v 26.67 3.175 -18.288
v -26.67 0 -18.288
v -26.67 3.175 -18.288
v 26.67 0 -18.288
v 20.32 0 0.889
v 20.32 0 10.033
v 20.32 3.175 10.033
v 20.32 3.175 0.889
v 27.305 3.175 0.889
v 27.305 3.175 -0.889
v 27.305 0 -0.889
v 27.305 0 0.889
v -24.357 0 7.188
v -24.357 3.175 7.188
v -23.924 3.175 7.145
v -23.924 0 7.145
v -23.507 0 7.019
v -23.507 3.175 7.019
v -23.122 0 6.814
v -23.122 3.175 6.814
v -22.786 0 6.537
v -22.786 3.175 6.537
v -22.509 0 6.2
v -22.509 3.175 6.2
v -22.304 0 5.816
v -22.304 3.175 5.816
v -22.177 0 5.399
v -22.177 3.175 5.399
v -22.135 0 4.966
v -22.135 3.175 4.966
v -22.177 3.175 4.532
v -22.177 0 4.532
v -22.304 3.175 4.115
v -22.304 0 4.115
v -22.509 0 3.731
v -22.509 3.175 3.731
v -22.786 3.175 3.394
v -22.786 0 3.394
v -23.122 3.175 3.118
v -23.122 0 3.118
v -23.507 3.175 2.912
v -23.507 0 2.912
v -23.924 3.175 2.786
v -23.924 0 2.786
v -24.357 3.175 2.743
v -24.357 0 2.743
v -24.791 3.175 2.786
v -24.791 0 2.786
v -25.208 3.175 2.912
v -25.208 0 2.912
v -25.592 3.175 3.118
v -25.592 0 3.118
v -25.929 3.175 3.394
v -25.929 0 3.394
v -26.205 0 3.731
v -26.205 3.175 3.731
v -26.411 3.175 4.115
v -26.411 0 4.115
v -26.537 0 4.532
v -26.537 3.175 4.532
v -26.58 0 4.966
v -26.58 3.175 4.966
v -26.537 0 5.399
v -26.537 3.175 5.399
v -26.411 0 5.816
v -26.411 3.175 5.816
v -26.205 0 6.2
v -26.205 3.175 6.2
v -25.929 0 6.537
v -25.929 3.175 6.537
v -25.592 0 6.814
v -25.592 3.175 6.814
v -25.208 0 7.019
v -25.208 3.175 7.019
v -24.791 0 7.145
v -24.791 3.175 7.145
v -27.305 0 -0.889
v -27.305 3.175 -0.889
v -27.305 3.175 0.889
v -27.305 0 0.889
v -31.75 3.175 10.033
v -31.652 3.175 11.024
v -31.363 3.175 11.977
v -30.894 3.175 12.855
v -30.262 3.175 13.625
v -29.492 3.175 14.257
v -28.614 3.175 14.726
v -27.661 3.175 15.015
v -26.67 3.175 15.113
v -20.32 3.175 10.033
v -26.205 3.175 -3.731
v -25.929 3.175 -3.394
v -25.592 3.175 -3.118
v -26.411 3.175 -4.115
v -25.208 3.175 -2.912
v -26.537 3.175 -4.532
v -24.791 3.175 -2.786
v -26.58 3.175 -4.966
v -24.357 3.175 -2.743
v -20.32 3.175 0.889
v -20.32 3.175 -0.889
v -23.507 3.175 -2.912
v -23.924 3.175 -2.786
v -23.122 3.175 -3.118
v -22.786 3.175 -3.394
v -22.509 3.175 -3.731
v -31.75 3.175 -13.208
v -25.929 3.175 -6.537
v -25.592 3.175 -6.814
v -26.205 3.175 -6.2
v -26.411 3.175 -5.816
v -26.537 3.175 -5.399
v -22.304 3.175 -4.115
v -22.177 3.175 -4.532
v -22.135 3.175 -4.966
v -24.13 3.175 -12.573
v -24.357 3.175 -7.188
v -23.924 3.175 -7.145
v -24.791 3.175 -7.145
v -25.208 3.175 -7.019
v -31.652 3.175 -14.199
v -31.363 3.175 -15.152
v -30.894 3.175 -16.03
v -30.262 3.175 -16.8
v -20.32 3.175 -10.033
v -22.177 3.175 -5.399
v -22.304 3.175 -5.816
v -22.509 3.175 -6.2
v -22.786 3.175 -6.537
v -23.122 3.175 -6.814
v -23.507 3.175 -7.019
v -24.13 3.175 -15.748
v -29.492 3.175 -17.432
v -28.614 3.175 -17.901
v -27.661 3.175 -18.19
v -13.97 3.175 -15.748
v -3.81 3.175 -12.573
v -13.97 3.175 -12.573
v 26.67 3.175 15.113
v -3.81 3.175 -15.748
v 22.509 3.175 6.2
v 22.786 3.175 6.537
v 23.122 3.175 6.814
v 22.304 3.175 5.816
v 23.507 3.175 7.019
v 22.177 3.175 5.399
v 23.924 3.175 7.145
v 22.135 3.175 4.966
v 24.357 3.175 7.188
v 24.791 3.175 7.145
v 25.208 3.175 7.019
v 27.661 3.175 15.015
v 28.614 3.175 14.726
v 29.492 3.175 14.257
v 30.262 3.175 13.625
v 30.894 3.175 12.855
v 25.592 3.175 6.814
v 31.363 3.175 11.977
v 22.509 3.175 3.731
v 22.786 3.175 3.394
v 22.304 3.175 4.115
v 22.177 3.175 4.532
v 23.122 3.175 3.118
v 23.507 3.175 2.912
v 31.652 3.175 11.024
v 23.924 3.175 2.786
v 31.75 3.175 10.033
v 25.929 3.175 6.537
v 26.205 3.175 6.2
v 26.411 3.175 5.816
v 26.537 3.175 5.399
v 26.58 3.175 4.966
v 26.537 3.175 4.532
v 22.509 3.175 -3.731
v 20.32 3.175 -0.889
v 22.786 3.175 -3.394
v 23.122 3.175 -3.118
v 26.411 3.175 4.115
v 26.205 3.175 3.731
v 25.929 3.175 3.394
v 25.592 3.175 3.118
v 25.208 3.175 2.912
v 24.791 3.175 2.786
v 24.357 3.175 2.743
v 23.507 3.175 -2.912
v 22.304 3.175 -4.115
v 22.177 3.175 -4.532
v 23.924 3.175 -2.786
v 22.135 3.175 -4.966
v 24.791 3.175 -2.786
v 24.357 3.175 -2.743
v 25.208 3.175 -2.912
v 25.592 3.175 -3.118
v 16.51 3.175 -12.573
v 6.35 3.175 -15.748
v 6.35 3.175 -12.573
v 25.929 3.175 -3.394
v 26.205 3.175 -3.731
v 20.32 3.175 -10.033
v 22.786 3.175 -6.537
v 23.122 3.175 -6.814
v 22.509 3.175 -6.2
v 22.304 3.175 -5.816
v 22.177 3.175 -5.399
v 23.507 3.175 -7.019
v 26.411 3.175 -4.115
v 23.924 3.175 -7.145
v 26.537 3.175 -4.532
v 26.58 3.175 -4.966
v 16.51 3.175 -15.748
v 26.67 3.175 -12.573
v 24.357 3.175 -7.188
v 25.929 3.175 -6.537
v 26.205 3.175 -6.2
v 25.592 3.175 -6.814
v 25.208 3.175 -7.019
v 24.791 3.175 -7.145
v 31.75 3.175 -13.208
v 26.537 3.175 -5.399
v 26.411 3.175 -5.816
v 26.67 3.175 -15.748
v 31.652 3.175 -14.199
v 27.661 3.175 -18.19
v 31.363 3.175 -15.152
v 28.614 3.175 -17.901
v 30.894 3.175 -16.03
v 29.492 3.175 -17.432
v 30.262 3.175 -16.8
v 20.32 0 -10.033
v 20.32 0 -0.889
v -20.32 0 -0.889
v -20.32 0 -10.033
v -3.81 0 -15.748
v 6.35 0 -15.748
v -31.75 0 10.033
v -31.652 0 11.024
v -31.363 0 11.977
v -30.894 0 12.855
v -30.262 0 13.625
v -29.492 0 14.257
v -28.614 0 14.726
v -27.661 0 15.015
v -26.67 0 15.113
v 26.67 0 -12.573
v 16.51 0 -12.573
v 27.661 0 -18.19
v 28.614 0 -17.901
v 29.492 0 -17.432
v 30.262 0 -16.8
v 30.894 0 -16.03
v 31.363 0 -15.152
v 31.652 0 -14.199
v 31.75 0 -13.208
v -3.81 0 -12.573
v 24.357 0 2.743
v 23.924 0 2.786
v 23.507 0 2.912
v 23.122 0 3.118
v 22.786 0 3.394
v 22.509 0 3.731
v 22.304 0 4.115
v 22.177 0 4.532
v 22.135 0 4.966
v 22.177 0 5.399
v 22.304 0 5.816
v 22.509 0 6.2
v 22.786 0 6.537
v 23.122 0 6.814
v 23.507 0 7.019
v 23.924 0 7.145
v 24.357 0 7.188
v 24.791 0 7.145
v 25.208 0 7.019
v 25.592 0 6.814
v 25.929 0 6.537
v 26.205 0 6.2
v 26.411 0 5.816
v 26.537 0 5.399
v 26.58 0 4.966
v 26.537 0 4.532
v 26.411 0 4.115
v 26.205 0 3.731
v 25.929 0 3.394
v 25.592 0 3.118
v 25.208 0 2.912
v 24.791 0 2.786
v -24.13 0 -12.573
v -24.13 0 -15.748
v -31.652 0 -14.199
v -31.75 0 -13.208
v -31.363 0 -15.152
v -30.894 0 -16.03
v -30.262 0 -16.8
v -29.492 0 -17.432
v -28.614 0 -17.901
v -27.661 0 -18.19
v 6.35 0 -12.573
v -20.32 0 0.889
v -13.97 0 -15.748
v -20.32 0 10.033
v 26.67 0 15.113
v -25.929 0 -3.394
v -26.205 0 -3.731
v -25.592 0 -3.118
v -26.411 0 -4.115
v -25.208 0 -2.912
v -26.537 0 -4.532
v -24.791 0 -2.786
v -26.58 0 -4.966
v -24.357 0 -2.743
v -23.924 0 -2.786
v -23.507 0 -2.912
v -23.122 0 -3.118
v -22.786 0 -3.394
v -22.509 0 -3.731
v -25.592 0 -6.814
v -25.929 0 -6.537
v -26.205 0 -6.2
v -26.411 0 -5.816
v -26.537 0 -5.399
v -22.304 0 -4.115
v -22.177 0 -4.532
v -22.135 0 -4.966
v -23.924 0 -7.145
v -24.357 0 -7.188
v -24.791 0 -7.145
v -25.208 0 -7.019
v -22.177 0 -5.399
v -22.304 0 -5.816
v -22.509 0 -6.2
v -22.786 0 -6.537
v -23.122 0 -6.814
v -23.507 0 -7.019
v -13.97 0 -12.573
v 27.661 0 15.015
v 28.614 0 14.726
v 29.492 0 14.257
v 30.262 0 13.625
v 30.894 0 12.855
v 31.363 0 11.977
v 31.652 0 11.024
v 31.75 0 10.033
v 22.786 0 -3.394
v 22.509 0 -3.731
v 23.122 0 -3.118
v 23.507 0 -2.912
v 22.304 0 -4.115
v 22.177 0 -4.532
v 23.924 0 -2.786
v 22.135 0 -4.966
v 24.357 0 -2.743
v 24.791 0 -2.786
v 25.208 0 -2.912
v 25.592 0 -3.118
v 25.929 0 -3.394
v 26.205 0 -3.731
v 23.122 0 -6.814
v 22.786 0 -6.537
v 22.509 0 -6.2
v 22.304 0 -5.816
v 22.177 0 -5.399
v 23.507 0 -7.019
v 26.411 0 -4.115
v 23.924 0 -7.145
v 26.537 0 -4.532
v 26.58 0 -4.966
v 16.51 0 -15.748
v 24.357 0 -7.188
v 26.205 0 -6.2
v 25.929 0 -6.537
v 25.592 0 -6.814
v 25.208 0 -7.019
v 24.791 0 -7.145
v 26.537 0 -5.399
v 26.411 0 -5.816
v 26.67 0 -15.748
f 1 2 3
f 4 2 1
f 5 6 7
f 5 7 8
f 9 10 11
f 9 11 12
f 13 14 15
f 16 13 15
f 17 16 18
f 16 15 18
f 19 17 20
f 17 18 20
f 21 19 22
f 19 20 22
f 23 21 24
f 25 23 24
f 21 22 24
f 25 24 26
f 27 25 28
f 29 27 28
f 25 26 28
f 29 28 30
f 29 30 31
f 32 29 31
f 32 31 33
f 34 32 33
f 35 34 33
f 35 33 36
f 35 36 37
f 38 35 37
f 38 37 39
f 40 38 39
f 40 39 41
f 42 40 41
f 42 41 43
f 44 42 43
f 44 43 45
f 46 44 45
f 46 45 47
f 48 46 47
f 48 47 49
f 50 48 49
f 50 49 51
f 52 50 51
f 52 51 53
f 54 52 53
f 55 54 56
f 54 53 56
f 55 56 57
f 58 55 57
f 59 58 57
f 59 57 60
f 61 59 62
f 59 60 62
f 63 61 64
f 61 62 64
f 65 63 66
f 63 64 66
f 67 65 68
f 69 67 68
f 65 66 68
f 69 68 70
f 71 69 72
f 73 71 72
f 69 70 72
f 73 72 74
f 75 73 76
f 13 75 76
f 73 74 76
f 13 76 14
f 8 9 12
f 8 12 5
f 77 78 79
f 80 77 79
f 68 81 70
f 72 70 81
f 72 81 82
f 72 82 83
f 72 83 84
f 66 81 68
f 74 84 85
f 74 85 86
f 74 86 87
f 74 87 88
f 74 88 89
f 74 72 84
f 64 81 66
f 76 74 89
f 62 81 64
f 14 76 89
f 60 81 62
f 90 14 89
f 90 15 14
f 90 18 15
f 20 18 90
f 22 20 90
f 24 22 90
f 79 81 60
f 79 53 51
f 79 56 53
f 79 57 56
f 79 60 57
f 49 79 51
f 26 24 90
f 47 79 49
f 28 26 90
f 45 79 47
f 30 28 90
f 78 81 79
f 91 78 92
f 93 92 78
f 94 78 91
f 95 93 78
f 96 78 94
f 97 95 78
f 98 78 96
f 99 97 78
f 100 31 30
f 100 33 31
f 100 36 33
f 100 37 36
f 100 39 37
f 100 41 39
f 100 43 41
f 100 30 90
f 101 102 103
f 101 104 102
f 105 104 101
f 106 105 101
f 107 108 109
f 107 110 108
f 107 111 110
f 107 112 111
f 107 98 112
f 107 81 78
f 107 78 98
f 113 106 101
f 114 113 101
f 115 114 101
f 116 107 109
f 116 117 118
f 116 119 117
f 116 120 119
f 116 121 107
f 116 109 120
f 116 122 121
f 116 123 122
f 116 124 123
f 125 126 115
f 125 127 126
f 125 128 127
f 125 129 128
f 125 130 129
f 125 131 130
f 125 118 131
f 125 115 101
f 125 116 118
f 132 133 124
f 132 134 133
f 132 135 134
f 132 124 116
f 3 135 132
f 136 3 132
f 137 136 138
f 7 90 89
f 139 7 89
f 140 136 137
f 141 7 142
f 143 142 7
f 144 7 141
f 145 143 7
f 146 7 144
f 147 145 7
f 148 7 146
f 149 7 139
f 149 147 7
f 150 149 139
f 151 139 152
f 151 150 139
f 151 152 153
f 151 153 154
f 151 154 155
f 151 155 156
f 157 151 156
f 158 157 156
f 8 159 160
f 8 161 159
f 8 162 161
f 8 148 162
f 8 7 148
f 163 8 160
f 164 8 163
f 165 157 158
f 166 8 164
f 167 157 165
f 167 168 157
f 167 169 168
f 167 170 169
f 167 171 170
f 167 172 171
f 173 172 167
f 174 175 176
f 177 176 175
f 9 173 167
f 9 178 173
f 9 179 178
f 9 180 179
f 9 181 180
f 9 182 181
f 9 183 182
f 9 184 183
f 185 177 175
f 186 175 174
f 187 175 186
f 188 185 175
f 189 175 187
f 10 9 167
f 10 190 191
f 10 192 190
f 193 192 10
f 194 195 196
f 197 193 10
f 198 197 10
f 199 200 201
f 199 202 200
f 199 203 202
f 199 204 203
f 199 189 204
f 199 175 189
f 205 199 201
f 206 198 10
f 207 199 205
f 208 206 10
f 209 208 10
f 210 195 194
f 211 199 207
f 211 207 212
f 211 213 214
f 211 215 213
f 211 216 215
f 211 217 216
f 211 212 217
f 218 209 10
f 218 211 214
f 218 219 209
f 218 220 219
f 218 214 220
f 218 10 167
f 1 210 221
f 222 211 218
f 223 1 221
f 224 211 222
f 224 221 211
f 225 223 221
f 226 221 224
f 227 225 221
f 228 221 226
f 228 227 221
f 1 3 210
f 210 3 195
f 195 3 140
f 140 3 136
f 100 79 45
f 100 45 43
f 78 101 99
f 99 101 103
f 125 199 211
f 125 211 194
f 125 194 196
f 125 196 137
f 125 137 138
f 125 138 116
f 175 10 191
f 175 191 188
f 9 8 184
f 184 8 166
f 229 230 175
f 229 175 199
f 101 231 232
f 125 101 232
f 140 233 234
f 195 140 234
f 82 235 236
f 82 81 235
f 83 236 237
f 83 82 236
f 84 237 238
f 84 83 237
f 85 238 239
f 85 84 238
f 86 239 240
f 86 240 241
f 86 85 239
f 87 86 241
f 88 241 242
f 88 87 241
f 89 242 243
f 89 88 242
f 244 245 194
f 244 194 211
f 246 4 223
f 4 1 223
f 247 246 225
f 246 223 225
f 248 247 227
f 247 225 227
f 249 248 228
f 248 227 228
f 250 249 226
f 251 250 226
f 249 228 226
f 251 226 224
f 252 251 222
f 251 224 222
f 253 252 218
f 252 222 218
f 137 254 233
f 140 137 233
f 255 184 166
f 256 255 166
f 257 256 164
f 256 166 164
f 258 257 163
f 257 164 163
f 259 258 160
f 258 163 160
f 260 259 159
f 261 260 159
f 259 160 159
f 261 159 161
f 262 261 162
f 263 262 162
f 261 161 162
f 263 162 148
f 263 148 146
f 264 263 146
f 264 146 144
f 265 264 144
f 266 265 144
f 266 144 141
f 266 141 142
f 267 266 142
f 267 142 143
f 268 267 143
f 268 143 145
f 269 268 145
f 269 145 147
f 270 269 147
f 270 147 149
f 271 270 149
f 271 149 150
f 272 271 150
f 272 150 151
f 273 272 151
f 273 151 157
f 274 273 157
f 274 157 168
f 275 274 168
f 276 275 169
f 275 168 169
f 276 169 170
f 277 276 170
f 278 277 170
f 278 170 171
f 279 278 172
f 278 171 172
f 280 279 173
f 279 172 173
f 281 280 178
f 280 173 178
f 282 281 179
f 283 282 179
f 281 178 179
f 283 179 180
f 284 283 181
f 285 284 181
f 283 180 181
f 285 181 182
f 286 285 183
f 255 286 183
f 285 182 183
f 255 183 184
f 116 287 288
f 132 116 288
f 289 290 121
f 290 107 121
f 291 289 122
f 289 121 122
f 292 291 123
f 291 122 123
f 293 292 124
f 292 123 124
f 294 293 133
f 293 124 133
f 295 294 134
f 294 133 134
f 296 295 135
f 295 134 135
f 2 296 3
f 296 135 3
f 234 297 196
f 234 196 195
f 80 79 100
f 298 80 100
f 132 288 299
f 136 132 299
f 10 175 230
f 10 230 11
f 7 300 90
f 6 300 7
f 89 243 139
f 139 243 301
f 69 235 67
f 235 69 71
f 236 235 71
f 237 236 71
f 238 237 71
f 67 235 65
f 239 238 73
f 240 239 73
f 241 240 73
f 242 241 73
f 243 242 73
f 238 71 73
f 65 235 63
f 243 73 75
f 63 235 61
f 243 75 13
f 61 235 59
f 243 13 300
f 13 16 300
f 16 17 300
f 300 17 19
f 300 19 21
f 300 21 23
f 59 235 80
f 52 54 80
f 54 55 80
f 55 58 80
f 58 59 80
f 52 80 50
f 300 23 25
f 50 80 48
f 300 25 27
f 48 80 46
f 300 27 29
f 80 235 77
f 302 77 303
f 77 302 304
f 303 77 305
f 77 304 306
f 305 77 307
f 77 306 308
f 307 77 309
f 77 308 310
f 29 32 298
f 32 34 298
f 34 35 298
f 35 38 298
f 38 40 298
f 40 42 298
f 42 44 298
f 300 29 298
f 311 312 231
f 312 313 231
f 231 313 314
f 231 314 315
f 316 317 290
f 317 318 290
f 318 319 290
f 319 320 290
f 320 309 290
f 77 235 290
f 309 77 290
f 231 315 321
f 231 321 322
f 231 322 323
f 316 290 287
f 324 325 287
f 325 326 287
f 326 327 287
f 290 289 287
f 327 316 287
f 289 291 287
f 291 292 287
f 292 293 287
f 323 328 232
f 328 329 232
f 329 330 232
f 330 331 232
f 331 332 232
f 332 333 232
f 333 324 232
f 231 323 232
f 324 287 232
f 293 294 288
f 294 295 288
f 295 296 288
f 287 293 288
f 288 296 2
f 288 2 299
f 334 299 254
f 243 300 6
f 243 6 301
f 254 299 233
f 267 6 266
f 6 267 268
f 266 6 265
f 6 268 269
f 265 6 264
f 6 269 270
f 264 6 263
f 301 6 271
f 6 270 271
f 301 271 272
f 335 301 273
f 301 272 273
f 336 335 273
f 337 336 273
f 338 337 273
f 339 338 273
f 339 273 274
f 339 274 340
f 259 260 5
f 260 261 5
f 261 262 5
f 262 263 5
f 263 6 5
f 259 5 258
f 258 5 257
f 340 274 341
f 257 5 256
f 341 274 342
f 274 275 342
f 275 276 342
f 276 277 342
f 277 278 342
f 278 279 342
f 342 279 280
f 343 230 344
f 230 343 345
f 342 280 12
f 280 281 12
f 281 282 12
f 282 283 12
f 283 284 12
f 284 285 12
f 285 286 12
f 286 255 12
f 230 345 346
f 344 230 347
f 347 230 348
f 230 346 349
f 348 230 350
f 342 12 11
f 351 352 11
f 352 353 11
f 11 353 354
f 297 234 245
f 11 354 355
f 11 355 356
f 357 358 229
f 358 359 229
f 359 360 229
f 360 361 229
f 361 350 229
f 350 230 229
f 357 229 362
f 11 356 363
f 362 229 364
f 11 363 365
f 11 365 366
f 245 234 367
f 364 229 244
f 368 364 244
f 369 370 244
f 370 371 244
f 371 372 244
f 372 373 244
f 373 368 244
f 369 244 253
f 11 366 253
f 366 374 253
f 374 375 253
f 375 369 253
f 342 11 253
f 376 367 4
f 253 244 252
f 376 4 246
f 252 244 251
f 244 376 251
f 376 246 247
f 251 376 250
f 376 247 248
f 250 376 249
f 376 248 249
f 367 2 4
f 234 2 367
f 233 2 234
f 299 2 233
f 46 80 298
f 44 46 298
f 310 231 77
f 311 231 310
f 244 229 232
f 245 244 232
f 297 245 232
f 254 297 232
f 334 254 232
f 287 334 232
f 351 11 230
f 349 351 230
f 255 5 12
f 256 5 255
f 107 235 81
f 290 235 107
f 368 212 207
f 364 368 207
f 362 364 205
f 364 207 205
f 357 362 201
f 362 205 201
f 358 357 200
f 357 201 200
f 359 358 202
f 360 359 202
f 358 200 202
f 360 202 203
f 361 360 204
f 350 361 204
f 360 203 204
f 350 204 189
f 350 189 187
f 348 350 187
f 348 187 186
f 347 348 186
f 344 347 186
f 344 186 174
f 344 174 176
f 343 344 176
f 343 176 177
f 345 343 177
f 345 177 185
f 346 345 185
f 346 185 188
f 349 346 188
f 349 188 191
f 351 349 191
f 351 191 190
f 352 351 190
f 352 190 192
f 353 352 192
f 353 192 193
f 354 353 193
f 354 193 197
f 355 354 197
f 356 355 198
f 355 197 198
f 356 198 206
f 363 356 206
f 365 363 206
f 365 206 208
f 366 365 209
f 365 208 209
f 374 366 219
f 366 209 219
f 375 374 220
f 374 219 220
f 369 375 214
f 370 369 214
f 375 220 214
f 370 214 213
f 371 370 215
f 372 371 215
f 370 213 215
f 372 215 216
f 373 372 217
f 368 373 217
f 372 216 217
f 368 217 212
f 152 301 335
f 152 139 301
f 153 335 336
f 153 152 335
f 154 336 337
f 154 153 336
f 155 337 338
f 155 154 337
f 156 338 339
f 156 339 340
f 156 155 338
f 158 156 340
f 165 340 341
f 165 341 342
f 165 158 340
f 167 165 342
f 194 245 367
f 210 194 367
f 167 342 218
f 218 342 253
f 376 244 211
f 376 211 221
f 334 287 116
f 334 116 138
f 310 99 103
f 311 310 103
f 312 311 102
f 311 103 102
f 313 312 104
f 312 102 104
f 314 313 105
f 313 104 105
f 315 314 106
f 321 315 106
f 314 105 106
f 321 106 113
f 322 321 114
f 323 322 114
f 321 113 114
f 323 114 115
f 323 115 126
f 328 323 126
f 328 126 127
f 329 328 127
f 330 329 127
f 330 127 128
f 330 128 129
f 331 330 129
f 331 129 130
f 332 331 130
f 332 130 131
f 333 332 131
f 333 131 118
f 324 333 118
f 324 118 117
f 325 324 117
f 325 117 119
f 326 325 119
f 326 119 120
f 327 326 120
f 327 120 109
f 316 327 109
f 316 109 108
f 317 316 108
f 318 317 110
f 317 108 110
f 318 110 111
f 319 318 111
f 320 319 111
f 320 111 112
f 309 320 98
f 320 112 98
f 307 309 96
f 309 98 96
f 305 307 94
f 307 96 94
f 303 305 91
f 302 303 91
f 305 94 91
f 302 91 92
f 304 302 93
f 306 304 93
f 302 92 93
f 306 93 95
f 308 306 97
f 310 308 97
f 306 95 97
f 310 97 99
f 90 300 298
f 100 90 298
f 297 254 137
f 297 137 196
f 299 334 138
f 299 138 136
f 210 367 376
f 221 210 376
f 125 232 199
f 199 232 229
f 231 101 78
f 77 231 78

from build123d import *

# Parameters (mm, degrees)
SKETCH1_W            = 63.5
SKETCH1_H            = 33.401
SKETCH1_W_2          = 10.16
SKETCH1_H_2          = 3.175
SKETCH1_W_3          = 40.64
SKETCH1_H_3          = 20.066
MAIN_EXTRUSION_DEPTH = 3.175
SKETCH3_R            = 2.2225
MOUNTING_HOLES_DEPTH = 37.777630008
TAB_CUTOUT_DEPTH     = 37.777630008
FILLET1_R            = 5.08


with BuildPart() as part:
    # Sketch1 → Main Extrusion (new body)
    with BuildSketch(Plane(origin=(0, 0, 0), x_dir=(1, 0, 0), z_dir=(0, 1, 0))):
        with Locations((0, 1.5875)):
            Rectangle(SKETCH1_W, SKETCH1_H)
        with Locations((21.59, 14.1605)):
            Rectangle(SKETCH1_W_2, SKETCH1_H_2, mode=Mode.SUBTRACT)
        with Locations((1.27, 14.1605)):
            Rectangle(SKETCH1_W_2, SKETCH1_H_2, mode=Mode.SUBTRACT)
        with Locations((-19.05, 14.1605)):
            Rectangle(SKETCH1_W_2, SKETCH1_H_2, mode=Mode.SUBTRACT)
        Rectangle(SKETCH1_W_3, SKETCH1_H_3, mode=Mode.SUBTRACT)
    extrude(amount=MAIN_EXTRUSION_DEPTH)

    # Sketch3 → Mounting Holes (cut, through all)
    with BuildSketch(Plane(origin=(0, 3.175, 0), x_dir=(1, 0, 0), z_dir=(0, 1, 0))):
        with Locations(Location((-24.357246486, 4.9657, 0), (0, 0, 270))):
            Circle(SKETCH3_R)
        with Locations(Location((-24.357246486, -4.9657, 0), (0, 0, 270))):
            Circle(SKETCH3_R)
        with Locations(Location((24.357246486, -4.9657, 0), (0, 0, 90))):
            Circle(SKETCH3_R)
        with Locations(Location((24.357246486, 4.9657, 0), (0, 0, 90))):
            Circle(SKETCH3_R)
    extrude(amount=-MOUNTING_HOLES_DEPTH, mode=Mode.SUBTRACT)

    # Sketch5 → Tab cutout (cut, through all)
    with BuildSketch(Plane(origin=(0, 3.175, 0), x_dir=(1, 0, 0), z_dir=(0, 1, 0))):
        Polygon((-20.32, 0), (-20.32, 0.889), (-27.305, 0.889), (-27.305, -0.889), (-20.32, -0.889), align=None)
        Polygon((27.305, -0.889), (20.32, -0.889), (20.32, 0), (20.32, 0.889), (27.305, 0.889), align=None)
    extrude(amount=-TAB_CUTOUT_DEPTH, mode=Mode.SUBTRACT)

    # Fillet1
    fillet1_edges = [part.edges().sort_by_distance(p)[0] for p in [
        (31.75, 1.5875, 15.113),
        (-31.75, 1.5875, 15.113),
        (-31.75, 1.5875, -18.288),
        (31.75, 1.5875, -18.288),
    ]]
    fillet(fillet1_edges, radius=FILLET1_R)


solid = part.part
